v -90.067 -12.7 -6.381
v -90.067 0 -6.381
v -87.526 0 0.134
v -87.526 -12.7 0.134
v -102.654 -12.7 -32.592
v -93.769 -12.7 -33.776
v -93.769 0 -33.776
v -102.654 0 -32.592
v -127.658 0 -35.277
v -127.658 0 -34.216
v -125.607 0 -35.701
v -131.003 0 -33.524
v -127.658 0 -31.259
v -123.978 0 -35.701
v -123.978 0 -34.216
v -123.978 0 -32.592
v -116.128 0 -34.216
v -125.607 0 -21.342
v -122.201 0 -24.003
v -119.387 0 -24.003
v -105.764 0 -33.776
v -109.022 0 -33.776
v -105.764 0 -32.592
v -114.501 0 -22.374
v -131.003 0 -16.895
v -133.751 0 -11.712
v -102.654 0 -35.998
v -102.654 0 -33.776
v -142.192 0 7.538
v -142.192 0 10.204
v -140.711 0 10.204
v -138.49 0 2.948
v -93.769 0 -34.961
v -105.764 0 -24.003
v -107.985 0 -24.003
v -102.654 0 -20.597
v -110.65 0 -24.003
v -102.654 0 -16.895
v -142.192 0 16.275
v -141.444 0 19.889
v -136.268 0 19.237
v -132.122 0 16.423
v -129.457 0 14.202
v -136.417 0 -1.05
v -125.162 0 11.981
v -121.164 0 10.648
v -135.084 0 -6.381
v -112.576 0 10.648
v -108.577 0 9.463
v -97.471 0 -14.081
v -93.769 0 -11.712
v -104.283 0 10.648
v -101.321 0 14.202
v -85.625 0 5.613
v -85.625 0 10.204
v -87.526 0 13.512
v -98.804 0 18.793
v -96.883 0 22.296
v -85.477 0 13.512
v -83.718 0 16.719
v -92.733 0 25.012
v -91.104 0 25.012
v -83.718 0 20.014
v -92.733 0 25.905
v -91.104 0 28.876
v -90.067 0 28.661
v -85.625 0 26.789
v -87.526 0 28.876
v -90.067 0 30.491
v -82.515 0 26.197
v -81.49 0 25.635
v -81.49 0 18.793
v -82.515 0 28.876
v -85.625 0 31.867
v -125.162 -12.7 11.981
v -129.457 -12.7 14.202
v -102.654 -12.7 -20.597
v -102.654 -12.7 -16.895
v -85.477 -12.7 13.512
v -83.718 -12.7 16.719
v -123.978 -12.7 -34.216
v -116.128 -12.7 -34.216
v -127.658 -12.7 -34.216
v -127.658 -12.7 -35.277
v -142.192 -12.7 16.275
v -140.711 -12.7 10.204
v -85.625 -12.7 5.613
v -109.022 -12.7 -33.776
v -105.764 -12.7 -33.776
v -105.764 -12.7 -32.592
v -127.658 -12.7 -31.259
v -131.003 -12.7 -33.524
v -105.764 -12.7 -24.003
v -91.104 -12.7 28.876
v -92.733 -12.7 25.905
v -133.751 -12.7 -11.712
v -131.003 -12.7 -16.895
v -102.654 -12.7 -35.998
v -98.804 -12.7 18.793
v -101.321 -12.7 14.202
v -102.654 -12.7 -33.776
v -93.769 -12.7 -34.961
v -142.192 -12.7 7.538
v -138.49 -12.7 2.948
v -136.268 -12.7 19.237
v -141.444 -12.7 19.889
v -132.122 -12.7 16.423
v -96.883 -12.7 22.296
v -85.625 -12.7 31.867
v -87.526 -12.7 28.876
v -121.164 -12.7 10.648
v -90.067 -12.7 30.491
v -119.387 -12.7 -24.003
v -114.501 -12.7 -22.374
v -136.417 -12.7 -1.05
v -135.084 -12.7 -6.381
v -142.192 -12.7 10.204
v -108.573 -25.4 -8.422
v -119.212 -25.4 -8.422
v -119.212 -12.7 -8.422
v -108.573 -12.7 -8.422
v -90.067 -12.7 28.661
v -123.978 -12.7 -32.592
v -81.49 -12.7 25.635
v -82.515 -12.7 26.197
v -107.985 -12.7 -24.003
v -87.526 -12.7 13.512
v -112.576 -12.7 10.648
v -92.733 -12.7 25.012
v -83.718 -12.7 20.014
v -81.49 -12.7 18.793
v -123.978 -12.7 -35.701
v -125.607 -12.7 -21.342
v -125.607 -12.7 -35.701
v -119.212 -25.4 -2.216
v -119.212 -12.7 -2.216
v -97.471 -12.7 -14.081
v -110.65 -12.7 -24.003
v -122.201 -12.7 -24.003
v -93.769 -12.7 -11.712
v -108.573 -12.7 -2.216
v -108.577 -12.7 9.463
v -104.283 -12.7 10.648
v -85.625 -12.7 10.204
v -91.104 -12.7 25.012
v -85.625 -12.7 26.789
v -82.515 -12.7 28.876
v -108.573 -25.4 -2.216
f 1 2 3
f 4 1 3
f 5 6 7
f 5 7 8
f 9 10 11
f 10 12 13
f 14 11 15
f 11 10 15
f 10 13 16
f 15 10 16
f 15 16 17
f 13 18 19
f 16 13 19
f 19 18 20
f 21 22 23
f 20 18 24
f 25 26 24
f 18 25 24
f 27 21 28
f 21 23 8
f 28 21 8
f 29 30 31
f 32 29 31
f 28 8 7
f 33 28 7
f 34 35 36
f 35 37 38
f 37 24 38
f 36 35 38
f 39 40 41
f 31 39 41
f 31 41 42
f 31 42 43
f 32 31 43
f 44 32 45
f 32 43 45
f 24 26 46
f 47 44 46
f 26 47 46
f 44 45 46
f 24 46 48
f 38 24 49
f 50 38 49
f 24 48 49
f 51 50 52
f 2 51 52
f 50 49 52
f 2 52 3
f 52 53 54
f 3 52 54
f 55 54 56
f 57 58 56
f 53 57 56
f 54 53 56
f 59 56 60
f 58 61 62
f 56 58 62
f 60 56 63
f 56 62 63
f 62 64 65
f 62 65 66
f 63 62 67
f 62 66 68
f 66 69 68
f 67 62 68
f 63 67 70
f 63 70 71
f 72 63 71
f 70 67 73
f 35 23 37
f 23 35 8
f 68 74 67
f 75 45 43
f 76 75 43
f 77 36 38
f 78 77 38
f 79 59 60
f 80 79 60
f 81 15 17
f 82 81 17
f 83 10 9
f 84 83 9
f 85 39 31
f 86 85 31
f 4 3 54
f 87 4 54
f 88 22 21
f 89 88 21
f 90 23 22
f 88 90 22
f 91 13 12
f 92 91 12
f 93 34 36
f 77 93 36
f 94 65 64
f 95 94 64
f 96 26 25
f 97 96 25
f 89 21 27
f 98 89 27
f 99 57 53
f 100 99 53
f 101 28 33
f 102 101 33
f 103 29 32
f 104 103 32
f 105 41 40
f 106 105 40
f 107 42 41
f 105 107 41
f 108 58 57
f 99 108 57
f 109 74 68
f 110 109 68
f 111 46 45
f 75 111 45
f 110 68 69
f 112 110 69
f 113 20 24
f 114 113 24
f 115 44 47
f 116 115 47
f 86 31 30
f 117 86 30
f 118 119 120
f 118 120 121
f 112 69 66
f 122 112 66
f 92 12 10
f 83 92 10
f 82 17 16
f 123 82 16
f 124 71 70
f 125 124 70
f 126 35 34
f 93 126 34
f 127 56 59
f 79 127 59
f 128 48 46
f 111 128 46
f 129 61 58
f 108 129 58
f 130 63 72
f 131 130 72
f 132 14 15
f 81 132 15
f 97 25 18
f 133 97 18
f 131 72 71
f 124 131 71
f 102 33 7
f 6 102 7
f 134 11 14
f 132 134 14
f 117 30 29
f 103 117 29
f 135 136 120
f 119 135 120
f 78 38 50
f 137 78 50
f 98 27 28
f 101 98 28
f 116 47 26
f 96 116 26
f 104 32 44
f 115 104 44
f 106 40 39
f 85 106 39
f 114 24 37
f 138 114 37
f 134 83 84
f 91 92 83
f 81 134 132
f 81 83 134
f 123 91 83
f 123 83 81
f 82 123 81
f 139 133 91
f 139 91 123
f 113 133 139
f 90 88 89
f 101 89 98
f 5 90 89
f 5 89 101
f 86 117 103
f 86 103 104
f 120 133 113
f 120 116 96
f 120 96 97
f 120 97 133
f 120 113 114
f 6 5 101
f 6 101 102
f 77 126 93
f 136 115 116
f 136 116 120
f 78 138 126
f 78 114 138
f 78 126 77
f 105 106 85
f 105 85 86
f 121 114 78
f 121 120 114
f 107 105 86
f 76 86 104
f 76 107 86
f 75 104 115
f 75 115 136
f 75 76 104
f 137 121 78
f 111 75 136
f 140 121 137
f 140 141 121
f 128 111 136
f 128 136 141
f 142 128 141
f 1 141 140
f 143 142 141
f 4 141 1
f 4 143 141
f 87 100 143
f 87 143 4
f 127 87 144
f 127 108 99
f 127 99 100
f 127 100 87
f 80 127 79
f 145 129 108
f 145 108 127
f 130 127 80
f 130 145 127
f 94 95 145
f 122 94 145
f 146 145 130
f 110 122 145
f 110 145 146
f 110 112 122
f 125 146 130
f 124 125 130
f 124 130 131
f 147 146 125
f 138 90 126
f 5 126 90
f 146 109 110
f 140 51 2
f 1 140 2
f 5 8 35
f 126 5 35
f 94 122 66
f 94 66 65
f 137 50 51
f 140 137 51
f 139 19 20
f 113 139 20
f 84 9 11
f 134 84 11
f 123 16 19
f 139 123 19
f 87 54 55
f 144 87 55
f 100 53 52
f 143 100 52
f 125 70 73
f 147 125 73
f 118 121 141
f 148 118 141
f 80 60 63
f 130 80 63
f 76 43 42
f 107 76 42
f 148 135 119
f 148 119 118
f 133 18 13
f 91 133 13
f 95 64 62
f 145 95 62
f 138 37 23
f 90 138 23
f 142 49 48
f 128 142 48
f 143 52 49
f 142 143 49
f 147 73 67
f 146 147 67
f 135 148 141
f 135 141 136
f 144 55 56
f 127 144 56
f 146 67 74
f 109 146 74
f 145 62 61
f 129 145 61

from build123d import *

# Parameters (mm, degrees)
F1_DEPTH = 12.7
F3_DEPTH = 12.7


with BuildPart() as f1:
    # F0 (on Front) → F1 (new body)
    with BuildSketch(Plane.XZ):
        Polygon((-132.122228, 16.423219), (-136.268499, 19.23676), (-141.444077, 19.888857), (-142.191744, 16.275135), (-140.710932, 10.20381), (-142.191744, 10.20381), (-142.191744, 7.53835), (-138.489716, 2.947835), (-136.416581, -1.050355), (-135.083851, -6.381276), (-133.751121, -11.712196), (-131.002761, -16.895032), (-125.606658, -21.342391), (-127.658351, -31.258902), (-131.002761, -33.523681), (-127.658351, -34.215628), (-127.658351, -35.276845), (-125.606658, -35.701333), (-123.977768, -35.701333), (-123.977768, -34.215628), (-116.128455, -34.215628), (-123.977768, -32.591632), (-122.200793, -24.002923), (-119.387253, -24.002923), (-114.500573, -22.374033), (-110.650467, -24.002923), (-105.763788, -32.591632), (-109.021573, -33.776282), (-105.763788, -33.776282), (-102.654087, -35.997501), (-102.654087, -33.776282), (-93.769217, -34.960932), (-93.769217, -33.776282), (-102.654087, -32.591632), (-107.985007, -24.002923), (-105.763788, -24.002923), (-102.654087, -20.597062), (-102.654087, -16.895032), (-97.471247, -14.081492), (-93.769217, -11.712196), (-90.067188, -6.381276), (-87.526385, 0.134294), (-85.624757, 5.613295), (-85.624757, 10.20381), (-87.526385, 13.511928), (-85.476677, 13.511928), (-83.717752, 16.71938), (-83.717752, 20.013939), (-81.490453, 18.792517), (-81.490453, 20.865652), (-81.490453, 25.634693), (-82.515056, 26.196572), (-82.515056, 28.875516), (-85.624757, 26.788895), (-85.624757, 31.866502), (-87.526385, 28.875516), (-90.067188, 30.490923), (-90.067188, 28.661053), (-91.103757, 28.875516), (-92.732648, 25.905185), (-91.103757, 25.011923), (-92.732648, 25.011923), (-96.882714, 22.295997), (-98.803977, 18.792517), (-101.321357, 14.202), (-104.282978, 10.648054), (-108.577332, 9.463405), (-112.575522, 10.648054), (-117.462198, 10.648054), (-121.164224, 10.648054), (-125.162414, 11.980785), (-129.456768, 14.202), align=None)
    extrude(amount=F1_DEPTH)

    # F2 (on face) → F3 (join)
    with BuildSketch(Plane.XZ.offset(12.7)):
        Polygon((-108.573183, -8.422106), (-108.573183, -4.432687), (-108.573183, -2.216344), (-119.211629, -2.216344), (-119.211629, -4.432687), (-119.211629, -8.422106), align=None)
    extrude(amount=F3_DEPTH)


solid = f1.part
